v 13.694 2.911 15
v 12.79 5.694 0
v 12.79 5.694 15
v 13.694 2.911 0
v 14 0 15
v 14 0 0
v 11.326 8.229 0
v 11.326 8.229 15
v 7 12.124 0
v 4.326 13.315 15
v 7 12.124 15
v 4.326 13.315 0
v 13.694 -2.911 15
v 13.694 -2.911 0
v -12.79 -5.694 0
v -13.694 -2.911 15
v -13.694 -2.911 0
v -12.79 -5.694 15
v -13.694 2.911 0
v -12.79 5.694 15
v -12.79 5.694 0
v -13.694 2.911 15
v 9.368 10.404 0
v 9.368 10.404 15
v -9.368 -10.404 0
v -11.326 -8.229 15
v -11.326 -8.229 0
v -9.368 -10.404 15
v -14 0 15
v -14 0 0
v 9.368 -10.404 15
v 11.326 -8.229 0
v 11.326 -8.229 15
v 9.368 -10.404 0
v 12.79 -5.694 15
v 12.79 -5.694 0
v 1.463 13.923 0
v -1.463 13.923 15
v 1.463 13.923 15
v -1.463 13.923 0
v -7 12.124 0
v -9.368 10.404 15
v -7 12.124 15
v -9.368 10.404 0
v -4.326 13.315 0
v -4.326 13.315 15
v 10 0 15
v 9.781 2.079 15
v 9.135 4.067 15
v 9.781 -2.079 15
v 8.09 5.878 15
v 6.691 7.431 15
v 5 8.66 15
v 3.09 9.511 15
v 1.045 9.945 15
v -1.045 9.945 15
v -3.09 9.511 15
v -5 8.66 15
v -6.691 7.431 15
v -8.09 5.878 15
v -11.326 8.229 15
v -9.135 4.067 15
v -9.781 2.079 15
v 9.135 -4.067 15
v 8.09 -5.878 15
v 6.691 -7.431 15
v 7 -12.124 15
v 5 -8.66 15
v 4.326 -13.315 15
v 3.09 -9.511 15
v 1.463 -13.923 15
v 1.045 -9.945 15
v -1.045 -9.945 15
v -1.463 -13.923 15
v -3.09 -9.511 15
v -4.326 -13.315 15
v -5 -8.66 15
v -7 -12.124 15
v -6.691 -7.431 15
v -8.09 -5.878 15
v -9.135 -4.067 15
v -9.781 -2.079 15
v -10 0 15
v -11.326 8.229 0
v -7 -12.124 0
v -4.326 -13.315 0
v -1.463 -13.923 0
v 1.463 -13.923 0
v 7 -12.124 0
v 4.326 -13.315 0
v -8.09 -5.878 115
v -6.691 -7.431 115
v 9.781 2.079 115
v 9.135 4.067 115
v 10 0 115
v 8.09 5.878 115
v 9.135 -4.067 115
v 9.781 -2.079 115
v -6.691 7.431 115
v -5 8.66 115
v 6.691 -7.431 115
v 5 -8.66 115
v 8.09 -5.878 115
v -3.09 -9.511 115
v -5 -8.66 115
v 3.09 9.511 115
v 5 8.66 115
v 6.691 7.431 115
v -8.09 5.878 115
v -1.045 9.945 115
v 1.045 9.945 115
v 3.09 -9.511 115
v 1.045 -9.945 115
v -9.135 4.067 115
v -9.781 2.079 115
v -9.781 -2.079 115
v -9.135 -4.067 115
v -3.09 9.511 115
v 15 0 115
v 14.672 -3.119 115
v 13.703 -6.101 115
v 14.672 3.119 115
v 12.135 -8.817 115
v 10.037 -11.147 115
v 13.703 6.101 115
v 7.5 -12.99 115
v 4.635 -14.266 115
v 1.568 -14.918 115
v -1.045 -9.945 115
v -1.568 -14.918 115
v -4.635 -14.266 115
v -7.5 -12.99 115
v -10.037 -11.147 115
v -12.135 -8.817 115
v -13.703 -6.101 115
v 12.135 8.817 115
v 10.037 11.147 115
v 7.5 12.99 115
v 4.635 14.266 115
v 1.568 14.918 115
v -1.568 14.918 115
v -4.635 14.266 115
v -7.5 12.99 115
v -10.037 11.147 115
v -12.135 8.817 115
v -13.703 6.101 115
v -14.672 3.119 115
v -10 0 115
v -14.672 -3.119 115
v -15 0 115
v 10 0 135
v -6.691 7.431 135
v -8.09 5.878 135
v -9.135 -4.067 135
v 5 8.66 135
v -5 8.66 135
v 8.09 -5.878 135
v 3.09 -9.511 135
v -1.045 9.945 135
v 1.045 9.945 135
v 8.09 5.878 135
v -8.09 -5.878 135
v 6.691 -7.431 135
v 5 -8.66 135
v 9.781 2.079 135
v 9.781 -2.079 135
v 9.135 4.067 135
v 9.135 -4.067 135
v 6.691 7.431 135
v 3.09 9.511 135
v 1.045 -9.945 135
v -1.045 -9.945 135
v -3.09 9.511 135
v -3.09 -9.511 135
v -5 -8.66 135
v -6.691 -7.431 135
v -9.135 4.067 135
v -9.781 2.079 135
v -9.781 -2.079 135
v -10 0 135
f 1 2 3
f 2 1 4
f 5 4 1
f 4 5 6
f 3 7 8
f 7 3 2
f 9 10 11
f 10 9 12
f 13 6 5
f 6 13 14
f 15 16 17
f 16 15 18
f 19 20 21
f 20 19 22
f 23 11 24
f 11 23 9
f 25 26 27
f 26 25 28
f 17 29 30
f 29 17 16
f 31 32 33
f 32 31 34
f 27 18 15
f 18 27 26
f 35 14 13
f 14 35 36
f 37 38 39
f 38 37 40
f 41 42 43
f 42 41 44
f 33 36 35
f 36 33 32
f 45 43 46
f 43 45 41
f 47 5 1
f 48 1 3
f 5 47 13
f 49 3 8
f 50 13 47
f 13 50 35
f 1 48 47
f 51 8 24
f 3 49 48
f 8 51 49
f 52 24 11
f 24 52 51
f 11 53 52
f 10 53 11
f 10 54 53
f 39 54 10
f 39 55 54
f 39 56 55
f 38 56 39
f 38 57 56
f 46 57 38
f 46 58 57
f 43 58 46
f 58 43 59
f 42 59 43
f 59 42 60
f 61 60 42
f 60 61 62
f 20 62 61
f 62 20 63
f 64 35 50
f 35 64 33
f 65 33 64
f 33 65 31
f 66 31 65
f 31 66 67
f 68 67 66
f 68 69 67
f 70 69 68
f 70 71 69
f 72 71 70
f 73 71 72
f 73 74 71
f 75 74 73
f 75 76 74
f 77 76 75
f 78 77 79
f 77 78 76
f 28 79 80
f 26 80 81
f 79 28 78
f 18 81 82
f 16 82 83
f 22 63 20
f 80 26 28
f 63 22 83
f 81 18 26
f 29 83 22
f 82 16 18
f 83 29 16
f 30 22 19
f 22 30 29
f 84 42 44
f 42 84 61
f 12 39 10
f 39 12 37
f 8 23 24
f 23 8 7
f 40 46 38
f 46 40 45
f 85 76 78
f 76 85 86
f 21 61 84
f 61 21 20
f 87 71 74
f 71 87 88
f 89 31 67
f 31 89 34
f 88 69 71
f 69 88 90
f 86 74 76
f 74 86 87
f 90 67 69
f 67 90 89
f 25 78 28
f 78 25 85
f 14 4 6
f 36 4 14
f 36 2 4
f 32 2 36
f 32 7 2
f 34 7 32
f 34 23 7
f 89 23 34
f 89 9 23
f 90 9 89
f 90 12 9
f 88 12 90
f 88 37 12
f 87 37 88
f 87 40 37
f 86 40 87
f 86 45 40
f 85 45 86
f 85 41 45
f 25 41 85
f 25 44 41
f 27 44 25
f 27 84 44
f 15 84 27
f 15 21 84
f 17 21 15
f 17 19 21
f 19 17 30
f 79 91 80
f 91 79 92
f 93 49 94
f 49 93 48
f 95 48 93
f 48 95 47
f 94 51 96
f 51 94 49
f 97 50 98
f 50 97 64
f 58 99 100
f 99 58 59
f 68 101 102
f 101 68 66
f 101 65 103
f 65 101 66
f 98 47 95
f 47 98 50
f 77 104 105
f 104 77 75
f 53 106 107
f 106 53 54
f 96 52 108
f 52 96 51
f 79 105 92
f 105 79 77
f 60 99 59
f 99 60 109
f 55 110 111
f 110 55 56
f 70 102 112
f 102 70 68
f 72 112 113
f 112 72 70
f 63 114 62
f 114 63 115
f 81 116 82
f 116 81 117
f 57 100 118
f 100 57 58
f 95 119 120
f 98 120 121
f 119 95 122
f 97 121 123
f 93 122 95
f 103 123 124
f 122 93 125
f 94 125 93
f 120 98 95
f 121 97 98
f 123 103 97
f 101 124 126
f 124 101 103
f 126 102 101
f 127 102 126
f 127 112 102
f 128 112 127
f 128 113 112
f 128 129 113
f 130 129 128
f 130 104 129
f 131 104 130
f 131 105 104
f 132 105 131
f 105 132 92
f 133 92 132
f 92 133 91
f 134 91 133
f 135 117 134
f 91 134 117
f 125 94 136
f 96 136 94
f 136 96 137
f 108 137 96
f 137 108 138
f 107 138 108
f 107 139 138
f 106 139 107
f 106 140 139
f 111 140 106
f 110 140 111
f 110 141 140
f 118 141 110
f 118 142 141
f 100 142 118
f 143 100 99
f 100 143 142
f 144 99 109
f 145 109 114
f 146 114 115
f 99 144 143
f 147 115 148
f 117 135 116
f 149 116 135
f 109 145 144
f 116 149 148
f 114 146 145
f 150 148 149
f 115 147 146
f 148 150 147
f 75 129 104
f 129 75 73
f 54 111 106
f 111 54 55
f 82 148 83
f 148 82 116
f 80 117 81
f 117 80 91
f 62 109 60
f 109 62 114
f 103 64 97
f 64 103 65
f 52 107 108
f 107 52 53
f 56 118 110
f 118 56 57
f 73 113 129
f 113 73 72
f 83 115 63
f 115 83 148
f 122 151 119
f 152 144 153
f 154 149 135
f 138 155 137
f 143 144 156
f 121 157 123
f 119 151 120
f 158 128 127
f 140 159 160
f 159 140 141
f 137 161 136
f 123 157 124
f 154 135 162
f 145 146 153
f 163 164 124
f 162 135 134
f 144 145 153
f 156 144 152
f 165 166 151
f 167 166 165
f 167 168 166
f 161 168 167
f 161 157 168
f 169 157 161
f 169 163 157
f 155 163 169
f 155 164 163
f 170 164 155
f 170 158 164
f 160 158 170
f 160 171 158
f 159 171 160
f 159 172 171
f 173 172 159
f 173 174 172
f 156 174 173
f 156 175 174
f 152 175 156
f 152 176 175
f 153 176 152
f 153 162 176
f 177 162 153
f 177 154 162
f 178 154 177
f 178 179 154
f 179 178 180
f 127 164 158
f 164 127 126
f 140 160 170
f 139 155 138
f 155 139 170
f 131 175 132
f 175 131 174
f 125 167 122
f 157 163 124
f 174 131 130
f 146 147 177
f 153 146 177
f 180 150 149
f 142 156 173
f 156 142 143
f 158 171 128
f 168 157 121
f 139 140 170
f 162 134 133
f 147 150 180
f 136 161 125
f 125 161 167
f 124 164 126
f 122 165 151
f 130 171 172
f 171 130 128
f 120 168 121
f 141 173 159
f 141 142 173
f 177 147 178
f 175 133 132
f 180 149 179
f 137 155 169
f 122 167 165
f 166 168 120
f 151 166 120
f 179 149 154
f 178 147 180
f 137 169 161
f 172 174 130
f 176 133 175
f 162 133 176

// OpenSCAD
// Roman Pillar Dimensions
pillar_height = 100;    // Height of the pillar shaft
pillar_radius = 10;     // Radius of the pillar shaft
base_height = 15;       // Height of the base
base_radius = 14;       // Radius of the base
capital_height = 20;    // Height of the capital
capital_radius = 15;    // Radius of the capital

// Create the Roman Pillar
module roman_pillar() {
    // Base of the Pillar
    cylinder(h = base_height, r = base_radius, center = false);
    
    // Shaft of the Pillar
    translate([0, 0, base_height])
        cylinder(h = pillar_height, r = pillar_radius, center = false);
    
    // Capital of the Pillar
    translate([0, 0, base_height + pillar_height])
        cylinder(h = capital_height, r1 = capital_radius, r2 = pillar_radius, center = false);
}

// Call the roman_pillar module to render the pillar
roman_pillar();
